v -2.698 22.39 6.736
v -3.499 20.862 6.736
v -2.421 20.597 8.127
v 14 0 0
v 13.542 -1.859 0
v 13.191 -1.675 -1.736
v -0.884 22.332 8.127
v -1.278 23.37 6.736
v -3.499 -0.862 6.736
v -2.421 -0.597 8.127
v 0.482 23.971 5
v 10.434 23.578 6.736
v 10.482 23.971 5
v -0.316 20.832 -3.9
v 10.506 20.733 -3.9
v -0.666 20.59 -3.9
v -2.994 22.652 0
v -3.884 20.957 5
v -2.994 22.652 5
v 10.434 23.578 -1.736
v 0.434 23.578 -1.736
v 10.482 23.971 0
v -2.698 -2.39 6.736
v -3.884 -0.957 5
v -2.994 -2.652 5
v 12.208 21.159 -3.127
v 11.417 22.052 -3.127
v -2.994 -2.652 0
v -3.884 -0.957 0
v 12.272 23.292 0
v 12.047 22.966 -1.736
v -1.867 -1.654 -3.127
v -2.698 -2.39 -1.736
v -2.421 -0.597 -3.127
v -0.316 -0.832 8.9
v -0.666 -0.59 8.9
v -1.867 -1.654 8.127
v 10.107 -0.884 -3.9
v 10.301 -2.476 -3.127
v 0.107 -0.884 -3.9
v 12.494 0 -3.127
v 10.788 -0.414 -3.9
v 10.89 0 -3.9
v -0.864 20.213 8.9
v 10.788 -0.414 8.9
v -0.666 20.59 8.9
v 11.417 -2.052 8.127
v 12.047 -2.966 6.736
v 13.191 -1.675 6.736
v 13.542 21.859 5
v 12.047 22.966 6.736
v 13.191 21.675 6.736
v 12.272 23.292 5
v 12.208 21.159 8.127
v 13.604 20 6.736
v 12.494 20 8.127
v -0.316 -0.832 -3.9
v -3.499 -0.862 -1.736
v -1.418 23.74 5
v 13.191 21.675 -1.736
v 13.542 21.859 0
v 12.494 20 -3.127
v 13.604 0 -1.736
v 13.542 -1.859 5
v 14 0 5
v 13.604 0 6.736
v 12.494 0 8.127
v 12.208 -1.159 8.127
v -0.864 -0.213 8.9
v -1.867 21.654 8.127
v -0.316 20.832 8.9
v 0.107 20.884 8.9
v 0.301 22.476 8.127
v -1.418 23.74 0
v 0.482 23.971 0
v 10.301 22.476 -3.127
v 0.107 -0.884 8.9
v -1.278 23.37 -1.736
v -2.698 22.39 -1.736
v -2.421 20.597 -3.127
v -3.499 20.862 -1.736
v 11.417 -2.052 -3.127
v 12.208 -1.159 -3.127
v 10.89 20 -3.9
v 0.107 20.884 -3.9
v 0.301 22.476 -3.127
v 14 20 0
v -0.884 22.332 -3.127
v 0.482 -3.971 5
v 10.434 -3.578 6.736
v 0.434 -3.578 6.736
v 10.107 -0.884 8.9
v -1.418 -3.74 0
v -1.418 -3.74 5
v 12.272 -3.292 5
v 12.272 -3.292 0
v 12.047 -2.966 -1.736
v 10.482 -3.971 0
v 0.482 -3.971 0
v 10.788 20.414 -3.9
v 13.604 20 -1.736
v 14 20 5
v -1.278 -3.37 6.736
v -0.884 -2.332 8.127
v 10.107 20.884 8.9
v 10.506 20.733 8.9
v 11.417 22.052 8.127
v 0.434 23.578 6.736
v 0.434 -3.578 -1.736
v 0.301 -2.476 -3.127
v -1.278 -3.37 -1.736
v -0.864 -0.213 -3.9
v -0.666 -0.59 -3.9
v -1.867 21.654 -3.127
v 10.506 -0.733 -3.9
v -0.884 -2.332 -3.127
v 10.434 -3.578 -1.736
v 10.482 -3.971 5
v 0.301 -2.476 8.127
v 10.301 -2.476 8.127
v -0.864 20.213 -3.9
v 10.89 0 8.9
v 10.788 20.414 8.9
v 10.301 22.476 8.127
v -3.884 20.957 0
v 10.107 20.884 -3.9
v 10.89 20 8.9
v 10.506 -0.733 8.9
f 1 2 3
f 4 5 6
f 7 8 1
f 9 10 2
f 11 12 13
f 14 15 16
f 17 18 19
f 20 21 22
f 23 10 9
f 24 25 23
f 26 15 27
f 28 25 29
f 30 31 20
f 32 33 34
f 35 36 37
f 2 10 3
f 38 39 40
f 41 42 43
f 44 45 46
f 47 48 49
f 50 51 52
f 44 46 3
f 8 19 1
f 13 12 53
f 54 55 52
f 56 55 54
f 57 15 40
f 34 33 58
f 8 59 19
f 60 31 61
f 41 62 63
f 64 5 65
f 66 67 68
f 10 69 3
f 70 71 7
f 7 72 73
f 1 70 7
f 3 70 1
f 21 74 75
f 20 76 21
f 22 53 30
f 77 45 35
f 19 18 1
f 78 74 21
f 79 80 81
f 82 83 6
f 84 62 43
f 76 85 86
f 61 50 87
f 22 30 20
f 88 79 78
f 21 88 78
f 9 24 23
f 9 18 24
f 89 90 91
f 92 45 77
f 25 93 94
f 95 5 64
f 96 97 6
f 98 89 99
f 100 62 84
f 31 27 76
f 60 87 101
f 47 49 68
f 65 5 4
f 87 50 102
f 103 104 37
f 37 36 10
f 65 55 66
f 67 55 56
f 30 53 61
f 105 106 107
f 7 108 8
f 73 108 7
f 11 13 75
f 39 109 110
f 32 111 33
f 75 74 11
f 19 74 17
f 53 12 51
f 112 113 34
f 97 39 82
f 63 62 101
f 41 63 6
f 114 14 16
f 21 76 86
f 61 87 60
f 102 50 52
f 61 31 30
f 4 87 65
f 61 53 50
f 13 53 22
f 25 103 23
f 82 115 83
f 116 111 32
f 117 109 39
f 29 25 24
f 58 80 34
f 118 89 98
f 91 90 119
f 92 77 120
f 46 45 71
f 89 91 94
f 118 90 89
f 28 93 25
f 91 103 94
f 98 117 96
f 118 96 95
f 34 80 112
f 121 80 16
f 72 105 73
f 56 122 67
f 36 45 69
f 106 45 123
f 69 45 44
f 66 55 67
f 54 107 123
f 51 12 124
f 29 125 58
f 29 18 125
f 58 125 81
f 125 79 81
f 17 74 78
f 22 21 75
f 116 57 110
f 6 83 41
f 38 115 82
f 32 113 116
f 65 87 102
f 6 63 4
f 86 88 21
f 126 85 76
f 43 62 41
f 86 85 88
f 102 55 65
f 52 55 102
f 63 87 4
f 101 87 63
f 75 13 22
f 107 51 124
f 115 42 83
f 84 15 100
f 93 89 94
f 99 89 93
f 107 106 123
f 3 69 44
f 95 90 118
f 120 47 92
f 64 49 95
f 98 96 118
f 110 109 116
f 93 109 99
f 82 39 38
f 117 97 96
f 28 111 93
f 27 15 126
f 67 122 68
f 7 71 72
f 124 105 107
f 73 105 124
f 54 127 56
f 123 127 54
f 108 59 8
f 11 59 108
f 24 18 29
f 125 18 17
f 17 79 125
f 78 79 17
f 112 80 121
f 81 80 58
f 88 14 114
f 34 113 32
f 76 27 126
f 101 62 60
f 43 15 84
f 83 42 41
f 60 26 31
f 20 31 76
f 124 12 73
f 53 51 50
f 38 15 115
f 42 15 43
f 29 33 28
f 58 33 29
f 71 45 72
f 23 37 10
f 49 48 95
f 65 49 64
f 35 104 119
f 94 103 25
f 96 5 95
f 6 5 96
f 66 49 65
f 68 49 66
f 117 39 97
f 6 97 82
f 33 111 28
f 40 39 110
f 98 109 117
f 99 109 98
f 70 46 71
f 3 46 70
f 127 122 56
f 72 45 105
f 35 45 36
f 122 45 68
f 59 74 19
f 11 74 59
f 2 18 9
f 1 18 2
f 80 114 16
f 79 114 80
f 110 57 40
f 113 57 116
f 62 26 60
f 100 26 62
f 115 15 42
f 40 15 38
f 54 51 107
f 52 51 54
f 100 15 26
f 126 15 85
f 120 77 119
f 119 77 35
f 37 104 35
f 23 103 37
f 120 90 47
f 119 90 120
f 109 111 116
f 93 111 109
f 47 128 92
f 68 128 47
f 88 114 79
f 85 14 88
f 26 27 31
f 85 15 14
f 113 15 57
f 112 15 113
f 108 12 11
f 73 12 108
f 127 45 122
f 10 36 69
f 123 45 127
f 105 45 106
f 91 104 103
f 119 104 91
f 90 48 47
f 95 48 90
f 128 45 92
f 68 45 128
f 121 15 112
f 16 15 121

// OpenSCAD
module h(v){hull(){translate(v){child(0);} child(0);}}
module h1(v){hull(){translate(v){child(0);} child(0);}}
module h2(v){hull(){translate(v){child(0);} child(0);}}
module roundedcube(size,r){
h2(v=[0,0,size[2]])h1(v=[0,size[1],0])h(v=[size[0],0,0])sphere(r);}

roundedcube([10,20,5],4);
